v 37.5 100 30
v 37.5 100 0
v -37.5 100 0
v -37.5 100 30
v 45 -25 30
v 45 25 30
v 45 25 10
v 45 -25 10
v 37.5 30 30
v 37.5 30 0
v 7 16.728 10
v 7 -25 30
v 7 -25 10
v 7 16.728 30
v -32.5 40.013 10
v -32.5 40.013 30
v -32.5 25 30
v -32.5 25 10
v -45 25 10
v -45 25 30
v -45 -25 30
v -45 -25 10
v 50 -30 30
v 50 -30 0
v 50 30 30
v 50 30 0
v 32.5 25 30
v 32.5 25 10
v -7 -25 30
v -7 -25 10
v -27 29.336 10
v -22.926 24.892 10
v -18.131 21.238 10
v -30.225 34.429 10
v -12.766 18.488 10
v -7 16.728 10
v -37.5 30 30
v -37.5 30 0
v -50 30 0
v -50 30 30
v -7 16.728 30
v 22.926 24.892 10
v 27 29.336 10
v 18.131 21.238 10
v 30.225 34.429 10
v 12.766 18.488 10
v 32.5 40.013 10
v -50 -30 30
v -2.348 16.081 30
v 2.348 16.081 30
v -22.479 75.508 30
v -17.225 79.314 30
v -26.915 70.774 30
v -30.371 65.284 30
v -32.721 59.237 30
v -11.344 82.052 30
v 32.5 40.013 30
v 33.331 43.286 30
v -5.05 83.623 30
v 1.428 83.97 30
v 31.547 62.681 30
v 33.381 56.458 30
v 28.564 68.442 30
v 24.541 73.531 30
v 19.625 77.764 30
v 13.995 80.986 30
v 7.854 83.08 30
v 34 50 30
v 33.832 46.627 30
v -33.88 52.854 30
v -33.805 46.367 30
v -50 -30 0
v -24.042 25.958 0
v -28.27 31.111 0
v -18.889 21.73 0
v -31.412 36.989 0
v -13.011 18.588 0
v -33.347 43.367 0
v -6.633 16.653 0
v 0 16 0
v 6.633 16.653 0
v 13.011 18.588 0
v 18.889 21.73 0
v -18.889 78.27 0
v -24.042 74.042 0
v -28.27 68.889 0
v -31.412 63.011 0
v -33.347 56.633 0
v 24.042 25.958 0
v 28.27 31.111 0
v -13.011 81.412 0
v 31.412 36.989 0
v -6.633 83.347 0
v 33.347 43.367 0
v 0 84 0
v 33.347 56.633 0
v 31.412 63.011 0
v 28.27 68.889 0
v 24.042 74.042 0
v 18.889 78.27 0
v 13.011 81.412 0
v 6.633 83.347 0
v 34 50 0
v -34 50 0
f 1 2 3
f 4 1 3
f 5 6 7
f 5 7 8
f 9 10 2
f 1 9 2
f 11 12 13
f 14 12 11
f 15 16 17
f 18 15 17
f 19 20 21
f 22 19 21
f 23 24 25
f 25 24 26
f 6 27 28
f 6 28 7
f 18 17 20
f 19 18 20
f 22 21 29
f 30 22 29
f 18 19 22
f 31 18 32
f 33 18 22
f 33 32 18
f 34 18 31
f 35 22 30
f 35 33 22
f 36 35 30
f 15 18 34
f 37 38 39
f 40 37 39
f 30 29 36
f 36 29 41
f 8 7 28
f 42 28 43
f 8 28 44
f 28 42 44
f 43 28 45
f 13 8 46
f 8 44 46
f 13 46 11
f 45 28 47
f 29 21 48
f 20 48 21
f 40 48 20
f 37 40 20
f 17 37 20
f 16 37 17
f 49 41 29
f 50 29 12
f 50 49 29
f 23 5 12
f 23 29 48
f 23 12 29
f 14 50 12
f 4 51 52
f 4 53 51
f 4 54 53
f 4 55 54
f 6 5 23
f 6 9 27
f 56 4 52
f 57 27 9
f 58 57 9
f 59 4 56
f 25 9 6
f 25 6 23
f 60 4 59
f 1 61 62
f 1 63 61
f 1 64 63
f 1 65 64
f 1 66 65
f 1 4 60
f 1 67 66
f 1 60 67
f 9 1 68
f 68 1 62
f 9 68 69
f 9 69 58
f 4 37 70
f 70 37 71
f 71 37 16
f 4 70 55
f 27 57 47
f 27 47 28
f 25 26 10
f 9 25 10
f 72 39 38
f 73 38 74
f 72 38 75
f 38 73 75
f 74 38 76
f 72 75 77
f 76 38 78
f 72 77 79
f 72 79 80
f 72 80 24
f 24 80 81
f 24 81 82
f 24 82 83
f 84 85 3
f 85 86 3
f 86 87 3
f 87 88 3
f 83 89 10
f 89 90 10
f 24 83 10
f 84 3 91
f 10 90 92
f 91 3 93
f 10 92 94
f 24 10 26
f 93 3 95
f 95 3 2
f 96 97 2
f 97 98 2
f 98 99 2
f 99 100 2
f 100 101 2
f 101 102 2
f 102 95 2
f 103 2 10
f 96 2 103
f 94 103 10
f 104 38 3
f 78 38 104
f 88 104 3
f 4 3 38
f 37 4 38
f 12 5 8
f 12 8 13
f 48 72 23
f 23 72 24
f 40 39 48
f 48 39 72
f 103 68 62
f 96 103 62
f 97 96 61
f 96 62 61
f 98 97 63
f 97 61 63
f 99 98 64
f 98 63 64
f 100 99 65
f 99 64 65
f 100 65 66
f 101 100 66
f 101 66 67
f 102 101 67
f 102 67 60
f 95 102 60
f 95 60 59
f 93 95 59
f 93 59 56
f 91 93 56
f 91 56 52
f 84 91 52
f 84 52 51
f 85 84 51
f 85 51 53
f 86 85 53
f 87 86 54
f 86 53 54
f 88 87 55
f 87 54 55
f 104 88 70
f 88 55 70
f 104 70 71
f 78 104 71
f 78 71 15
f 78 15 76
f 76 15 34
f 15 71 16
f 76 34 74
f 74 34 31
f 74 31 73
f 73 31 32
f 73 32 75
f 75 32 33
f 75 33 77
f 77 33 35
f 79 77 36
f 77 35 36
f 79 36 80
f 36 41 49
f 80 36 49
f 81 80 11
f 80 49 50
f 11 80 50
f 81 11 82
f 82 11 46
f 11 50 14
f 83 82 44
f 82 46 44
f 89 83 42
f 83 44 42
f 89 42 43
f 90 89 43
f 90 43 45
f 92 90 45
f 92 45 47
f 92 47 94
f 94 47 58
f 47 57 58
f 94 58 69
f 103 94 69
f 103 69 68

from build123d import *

# Parameters (mm, degrees)
EXTRUDE_1_DEPTH     = 30
SKETCH_2_R          = 34
CUT_EXTRUDE_1_DEPTH = 116.758369028
CUT_EXTRUDE_2_DEPTH = 20


with BuildPart() as part:
    # 草圖1 → 填料-伸長1 (new body)
    with BuildSketch(Plane.XY):
        Polygon((-50, -30), (50, -30), (50, 30), (37.5, 30), (37.5, 100), (-37.5, 100), (-37.5, 30), (-50, 30), align=None)
    extrude(amount=EXTRUDE_1_DEPTH)

    # 草圖2 → 除料-伸長1 (cut, through all)
    with BuildSketch(Plane.XY.offset(30)):
        with Locations((0, 50)):
            Circle(SKETCH_2_R)
    extrude(amount=-CUT_EXTRUDE_1_DEPTH, mode=Mode.SUBTRACT)

    # 草圖3 → 除料-伸長2 (cut)
    with BuildSketch(Plane.XY.offset(30)):
        with BuildLine():
            Line((-45, -25), (-7, -25))
            Line((-7, -25), (-7, 16.728390481))
            ThreePointArc((-7, 16.728390481), (-22.925968466, 24.892232877), (-32.5, 40.012507822))
            Line((-32.5, 40.012507822), (-32.5, 25))
            Line((-32.5, 25), (-45, 25))
            Line((-45, 25), (-45, -25))
        make_face()
    cut_extrude_2 = extrude(amount=-CUT_EXTRUDE_2_DEPTH, mode=Mode.SUBTRACT)

    # 鏡射1: 除料-伸長2 across plane
    add(cut_extrude_2.mirror(Plane(origin=(0, 0, 0), x_dir=(0, 0, 1), z_dir=(1, 0, 0))), mode=Mode.SUBTRACT)


solid = part.part
